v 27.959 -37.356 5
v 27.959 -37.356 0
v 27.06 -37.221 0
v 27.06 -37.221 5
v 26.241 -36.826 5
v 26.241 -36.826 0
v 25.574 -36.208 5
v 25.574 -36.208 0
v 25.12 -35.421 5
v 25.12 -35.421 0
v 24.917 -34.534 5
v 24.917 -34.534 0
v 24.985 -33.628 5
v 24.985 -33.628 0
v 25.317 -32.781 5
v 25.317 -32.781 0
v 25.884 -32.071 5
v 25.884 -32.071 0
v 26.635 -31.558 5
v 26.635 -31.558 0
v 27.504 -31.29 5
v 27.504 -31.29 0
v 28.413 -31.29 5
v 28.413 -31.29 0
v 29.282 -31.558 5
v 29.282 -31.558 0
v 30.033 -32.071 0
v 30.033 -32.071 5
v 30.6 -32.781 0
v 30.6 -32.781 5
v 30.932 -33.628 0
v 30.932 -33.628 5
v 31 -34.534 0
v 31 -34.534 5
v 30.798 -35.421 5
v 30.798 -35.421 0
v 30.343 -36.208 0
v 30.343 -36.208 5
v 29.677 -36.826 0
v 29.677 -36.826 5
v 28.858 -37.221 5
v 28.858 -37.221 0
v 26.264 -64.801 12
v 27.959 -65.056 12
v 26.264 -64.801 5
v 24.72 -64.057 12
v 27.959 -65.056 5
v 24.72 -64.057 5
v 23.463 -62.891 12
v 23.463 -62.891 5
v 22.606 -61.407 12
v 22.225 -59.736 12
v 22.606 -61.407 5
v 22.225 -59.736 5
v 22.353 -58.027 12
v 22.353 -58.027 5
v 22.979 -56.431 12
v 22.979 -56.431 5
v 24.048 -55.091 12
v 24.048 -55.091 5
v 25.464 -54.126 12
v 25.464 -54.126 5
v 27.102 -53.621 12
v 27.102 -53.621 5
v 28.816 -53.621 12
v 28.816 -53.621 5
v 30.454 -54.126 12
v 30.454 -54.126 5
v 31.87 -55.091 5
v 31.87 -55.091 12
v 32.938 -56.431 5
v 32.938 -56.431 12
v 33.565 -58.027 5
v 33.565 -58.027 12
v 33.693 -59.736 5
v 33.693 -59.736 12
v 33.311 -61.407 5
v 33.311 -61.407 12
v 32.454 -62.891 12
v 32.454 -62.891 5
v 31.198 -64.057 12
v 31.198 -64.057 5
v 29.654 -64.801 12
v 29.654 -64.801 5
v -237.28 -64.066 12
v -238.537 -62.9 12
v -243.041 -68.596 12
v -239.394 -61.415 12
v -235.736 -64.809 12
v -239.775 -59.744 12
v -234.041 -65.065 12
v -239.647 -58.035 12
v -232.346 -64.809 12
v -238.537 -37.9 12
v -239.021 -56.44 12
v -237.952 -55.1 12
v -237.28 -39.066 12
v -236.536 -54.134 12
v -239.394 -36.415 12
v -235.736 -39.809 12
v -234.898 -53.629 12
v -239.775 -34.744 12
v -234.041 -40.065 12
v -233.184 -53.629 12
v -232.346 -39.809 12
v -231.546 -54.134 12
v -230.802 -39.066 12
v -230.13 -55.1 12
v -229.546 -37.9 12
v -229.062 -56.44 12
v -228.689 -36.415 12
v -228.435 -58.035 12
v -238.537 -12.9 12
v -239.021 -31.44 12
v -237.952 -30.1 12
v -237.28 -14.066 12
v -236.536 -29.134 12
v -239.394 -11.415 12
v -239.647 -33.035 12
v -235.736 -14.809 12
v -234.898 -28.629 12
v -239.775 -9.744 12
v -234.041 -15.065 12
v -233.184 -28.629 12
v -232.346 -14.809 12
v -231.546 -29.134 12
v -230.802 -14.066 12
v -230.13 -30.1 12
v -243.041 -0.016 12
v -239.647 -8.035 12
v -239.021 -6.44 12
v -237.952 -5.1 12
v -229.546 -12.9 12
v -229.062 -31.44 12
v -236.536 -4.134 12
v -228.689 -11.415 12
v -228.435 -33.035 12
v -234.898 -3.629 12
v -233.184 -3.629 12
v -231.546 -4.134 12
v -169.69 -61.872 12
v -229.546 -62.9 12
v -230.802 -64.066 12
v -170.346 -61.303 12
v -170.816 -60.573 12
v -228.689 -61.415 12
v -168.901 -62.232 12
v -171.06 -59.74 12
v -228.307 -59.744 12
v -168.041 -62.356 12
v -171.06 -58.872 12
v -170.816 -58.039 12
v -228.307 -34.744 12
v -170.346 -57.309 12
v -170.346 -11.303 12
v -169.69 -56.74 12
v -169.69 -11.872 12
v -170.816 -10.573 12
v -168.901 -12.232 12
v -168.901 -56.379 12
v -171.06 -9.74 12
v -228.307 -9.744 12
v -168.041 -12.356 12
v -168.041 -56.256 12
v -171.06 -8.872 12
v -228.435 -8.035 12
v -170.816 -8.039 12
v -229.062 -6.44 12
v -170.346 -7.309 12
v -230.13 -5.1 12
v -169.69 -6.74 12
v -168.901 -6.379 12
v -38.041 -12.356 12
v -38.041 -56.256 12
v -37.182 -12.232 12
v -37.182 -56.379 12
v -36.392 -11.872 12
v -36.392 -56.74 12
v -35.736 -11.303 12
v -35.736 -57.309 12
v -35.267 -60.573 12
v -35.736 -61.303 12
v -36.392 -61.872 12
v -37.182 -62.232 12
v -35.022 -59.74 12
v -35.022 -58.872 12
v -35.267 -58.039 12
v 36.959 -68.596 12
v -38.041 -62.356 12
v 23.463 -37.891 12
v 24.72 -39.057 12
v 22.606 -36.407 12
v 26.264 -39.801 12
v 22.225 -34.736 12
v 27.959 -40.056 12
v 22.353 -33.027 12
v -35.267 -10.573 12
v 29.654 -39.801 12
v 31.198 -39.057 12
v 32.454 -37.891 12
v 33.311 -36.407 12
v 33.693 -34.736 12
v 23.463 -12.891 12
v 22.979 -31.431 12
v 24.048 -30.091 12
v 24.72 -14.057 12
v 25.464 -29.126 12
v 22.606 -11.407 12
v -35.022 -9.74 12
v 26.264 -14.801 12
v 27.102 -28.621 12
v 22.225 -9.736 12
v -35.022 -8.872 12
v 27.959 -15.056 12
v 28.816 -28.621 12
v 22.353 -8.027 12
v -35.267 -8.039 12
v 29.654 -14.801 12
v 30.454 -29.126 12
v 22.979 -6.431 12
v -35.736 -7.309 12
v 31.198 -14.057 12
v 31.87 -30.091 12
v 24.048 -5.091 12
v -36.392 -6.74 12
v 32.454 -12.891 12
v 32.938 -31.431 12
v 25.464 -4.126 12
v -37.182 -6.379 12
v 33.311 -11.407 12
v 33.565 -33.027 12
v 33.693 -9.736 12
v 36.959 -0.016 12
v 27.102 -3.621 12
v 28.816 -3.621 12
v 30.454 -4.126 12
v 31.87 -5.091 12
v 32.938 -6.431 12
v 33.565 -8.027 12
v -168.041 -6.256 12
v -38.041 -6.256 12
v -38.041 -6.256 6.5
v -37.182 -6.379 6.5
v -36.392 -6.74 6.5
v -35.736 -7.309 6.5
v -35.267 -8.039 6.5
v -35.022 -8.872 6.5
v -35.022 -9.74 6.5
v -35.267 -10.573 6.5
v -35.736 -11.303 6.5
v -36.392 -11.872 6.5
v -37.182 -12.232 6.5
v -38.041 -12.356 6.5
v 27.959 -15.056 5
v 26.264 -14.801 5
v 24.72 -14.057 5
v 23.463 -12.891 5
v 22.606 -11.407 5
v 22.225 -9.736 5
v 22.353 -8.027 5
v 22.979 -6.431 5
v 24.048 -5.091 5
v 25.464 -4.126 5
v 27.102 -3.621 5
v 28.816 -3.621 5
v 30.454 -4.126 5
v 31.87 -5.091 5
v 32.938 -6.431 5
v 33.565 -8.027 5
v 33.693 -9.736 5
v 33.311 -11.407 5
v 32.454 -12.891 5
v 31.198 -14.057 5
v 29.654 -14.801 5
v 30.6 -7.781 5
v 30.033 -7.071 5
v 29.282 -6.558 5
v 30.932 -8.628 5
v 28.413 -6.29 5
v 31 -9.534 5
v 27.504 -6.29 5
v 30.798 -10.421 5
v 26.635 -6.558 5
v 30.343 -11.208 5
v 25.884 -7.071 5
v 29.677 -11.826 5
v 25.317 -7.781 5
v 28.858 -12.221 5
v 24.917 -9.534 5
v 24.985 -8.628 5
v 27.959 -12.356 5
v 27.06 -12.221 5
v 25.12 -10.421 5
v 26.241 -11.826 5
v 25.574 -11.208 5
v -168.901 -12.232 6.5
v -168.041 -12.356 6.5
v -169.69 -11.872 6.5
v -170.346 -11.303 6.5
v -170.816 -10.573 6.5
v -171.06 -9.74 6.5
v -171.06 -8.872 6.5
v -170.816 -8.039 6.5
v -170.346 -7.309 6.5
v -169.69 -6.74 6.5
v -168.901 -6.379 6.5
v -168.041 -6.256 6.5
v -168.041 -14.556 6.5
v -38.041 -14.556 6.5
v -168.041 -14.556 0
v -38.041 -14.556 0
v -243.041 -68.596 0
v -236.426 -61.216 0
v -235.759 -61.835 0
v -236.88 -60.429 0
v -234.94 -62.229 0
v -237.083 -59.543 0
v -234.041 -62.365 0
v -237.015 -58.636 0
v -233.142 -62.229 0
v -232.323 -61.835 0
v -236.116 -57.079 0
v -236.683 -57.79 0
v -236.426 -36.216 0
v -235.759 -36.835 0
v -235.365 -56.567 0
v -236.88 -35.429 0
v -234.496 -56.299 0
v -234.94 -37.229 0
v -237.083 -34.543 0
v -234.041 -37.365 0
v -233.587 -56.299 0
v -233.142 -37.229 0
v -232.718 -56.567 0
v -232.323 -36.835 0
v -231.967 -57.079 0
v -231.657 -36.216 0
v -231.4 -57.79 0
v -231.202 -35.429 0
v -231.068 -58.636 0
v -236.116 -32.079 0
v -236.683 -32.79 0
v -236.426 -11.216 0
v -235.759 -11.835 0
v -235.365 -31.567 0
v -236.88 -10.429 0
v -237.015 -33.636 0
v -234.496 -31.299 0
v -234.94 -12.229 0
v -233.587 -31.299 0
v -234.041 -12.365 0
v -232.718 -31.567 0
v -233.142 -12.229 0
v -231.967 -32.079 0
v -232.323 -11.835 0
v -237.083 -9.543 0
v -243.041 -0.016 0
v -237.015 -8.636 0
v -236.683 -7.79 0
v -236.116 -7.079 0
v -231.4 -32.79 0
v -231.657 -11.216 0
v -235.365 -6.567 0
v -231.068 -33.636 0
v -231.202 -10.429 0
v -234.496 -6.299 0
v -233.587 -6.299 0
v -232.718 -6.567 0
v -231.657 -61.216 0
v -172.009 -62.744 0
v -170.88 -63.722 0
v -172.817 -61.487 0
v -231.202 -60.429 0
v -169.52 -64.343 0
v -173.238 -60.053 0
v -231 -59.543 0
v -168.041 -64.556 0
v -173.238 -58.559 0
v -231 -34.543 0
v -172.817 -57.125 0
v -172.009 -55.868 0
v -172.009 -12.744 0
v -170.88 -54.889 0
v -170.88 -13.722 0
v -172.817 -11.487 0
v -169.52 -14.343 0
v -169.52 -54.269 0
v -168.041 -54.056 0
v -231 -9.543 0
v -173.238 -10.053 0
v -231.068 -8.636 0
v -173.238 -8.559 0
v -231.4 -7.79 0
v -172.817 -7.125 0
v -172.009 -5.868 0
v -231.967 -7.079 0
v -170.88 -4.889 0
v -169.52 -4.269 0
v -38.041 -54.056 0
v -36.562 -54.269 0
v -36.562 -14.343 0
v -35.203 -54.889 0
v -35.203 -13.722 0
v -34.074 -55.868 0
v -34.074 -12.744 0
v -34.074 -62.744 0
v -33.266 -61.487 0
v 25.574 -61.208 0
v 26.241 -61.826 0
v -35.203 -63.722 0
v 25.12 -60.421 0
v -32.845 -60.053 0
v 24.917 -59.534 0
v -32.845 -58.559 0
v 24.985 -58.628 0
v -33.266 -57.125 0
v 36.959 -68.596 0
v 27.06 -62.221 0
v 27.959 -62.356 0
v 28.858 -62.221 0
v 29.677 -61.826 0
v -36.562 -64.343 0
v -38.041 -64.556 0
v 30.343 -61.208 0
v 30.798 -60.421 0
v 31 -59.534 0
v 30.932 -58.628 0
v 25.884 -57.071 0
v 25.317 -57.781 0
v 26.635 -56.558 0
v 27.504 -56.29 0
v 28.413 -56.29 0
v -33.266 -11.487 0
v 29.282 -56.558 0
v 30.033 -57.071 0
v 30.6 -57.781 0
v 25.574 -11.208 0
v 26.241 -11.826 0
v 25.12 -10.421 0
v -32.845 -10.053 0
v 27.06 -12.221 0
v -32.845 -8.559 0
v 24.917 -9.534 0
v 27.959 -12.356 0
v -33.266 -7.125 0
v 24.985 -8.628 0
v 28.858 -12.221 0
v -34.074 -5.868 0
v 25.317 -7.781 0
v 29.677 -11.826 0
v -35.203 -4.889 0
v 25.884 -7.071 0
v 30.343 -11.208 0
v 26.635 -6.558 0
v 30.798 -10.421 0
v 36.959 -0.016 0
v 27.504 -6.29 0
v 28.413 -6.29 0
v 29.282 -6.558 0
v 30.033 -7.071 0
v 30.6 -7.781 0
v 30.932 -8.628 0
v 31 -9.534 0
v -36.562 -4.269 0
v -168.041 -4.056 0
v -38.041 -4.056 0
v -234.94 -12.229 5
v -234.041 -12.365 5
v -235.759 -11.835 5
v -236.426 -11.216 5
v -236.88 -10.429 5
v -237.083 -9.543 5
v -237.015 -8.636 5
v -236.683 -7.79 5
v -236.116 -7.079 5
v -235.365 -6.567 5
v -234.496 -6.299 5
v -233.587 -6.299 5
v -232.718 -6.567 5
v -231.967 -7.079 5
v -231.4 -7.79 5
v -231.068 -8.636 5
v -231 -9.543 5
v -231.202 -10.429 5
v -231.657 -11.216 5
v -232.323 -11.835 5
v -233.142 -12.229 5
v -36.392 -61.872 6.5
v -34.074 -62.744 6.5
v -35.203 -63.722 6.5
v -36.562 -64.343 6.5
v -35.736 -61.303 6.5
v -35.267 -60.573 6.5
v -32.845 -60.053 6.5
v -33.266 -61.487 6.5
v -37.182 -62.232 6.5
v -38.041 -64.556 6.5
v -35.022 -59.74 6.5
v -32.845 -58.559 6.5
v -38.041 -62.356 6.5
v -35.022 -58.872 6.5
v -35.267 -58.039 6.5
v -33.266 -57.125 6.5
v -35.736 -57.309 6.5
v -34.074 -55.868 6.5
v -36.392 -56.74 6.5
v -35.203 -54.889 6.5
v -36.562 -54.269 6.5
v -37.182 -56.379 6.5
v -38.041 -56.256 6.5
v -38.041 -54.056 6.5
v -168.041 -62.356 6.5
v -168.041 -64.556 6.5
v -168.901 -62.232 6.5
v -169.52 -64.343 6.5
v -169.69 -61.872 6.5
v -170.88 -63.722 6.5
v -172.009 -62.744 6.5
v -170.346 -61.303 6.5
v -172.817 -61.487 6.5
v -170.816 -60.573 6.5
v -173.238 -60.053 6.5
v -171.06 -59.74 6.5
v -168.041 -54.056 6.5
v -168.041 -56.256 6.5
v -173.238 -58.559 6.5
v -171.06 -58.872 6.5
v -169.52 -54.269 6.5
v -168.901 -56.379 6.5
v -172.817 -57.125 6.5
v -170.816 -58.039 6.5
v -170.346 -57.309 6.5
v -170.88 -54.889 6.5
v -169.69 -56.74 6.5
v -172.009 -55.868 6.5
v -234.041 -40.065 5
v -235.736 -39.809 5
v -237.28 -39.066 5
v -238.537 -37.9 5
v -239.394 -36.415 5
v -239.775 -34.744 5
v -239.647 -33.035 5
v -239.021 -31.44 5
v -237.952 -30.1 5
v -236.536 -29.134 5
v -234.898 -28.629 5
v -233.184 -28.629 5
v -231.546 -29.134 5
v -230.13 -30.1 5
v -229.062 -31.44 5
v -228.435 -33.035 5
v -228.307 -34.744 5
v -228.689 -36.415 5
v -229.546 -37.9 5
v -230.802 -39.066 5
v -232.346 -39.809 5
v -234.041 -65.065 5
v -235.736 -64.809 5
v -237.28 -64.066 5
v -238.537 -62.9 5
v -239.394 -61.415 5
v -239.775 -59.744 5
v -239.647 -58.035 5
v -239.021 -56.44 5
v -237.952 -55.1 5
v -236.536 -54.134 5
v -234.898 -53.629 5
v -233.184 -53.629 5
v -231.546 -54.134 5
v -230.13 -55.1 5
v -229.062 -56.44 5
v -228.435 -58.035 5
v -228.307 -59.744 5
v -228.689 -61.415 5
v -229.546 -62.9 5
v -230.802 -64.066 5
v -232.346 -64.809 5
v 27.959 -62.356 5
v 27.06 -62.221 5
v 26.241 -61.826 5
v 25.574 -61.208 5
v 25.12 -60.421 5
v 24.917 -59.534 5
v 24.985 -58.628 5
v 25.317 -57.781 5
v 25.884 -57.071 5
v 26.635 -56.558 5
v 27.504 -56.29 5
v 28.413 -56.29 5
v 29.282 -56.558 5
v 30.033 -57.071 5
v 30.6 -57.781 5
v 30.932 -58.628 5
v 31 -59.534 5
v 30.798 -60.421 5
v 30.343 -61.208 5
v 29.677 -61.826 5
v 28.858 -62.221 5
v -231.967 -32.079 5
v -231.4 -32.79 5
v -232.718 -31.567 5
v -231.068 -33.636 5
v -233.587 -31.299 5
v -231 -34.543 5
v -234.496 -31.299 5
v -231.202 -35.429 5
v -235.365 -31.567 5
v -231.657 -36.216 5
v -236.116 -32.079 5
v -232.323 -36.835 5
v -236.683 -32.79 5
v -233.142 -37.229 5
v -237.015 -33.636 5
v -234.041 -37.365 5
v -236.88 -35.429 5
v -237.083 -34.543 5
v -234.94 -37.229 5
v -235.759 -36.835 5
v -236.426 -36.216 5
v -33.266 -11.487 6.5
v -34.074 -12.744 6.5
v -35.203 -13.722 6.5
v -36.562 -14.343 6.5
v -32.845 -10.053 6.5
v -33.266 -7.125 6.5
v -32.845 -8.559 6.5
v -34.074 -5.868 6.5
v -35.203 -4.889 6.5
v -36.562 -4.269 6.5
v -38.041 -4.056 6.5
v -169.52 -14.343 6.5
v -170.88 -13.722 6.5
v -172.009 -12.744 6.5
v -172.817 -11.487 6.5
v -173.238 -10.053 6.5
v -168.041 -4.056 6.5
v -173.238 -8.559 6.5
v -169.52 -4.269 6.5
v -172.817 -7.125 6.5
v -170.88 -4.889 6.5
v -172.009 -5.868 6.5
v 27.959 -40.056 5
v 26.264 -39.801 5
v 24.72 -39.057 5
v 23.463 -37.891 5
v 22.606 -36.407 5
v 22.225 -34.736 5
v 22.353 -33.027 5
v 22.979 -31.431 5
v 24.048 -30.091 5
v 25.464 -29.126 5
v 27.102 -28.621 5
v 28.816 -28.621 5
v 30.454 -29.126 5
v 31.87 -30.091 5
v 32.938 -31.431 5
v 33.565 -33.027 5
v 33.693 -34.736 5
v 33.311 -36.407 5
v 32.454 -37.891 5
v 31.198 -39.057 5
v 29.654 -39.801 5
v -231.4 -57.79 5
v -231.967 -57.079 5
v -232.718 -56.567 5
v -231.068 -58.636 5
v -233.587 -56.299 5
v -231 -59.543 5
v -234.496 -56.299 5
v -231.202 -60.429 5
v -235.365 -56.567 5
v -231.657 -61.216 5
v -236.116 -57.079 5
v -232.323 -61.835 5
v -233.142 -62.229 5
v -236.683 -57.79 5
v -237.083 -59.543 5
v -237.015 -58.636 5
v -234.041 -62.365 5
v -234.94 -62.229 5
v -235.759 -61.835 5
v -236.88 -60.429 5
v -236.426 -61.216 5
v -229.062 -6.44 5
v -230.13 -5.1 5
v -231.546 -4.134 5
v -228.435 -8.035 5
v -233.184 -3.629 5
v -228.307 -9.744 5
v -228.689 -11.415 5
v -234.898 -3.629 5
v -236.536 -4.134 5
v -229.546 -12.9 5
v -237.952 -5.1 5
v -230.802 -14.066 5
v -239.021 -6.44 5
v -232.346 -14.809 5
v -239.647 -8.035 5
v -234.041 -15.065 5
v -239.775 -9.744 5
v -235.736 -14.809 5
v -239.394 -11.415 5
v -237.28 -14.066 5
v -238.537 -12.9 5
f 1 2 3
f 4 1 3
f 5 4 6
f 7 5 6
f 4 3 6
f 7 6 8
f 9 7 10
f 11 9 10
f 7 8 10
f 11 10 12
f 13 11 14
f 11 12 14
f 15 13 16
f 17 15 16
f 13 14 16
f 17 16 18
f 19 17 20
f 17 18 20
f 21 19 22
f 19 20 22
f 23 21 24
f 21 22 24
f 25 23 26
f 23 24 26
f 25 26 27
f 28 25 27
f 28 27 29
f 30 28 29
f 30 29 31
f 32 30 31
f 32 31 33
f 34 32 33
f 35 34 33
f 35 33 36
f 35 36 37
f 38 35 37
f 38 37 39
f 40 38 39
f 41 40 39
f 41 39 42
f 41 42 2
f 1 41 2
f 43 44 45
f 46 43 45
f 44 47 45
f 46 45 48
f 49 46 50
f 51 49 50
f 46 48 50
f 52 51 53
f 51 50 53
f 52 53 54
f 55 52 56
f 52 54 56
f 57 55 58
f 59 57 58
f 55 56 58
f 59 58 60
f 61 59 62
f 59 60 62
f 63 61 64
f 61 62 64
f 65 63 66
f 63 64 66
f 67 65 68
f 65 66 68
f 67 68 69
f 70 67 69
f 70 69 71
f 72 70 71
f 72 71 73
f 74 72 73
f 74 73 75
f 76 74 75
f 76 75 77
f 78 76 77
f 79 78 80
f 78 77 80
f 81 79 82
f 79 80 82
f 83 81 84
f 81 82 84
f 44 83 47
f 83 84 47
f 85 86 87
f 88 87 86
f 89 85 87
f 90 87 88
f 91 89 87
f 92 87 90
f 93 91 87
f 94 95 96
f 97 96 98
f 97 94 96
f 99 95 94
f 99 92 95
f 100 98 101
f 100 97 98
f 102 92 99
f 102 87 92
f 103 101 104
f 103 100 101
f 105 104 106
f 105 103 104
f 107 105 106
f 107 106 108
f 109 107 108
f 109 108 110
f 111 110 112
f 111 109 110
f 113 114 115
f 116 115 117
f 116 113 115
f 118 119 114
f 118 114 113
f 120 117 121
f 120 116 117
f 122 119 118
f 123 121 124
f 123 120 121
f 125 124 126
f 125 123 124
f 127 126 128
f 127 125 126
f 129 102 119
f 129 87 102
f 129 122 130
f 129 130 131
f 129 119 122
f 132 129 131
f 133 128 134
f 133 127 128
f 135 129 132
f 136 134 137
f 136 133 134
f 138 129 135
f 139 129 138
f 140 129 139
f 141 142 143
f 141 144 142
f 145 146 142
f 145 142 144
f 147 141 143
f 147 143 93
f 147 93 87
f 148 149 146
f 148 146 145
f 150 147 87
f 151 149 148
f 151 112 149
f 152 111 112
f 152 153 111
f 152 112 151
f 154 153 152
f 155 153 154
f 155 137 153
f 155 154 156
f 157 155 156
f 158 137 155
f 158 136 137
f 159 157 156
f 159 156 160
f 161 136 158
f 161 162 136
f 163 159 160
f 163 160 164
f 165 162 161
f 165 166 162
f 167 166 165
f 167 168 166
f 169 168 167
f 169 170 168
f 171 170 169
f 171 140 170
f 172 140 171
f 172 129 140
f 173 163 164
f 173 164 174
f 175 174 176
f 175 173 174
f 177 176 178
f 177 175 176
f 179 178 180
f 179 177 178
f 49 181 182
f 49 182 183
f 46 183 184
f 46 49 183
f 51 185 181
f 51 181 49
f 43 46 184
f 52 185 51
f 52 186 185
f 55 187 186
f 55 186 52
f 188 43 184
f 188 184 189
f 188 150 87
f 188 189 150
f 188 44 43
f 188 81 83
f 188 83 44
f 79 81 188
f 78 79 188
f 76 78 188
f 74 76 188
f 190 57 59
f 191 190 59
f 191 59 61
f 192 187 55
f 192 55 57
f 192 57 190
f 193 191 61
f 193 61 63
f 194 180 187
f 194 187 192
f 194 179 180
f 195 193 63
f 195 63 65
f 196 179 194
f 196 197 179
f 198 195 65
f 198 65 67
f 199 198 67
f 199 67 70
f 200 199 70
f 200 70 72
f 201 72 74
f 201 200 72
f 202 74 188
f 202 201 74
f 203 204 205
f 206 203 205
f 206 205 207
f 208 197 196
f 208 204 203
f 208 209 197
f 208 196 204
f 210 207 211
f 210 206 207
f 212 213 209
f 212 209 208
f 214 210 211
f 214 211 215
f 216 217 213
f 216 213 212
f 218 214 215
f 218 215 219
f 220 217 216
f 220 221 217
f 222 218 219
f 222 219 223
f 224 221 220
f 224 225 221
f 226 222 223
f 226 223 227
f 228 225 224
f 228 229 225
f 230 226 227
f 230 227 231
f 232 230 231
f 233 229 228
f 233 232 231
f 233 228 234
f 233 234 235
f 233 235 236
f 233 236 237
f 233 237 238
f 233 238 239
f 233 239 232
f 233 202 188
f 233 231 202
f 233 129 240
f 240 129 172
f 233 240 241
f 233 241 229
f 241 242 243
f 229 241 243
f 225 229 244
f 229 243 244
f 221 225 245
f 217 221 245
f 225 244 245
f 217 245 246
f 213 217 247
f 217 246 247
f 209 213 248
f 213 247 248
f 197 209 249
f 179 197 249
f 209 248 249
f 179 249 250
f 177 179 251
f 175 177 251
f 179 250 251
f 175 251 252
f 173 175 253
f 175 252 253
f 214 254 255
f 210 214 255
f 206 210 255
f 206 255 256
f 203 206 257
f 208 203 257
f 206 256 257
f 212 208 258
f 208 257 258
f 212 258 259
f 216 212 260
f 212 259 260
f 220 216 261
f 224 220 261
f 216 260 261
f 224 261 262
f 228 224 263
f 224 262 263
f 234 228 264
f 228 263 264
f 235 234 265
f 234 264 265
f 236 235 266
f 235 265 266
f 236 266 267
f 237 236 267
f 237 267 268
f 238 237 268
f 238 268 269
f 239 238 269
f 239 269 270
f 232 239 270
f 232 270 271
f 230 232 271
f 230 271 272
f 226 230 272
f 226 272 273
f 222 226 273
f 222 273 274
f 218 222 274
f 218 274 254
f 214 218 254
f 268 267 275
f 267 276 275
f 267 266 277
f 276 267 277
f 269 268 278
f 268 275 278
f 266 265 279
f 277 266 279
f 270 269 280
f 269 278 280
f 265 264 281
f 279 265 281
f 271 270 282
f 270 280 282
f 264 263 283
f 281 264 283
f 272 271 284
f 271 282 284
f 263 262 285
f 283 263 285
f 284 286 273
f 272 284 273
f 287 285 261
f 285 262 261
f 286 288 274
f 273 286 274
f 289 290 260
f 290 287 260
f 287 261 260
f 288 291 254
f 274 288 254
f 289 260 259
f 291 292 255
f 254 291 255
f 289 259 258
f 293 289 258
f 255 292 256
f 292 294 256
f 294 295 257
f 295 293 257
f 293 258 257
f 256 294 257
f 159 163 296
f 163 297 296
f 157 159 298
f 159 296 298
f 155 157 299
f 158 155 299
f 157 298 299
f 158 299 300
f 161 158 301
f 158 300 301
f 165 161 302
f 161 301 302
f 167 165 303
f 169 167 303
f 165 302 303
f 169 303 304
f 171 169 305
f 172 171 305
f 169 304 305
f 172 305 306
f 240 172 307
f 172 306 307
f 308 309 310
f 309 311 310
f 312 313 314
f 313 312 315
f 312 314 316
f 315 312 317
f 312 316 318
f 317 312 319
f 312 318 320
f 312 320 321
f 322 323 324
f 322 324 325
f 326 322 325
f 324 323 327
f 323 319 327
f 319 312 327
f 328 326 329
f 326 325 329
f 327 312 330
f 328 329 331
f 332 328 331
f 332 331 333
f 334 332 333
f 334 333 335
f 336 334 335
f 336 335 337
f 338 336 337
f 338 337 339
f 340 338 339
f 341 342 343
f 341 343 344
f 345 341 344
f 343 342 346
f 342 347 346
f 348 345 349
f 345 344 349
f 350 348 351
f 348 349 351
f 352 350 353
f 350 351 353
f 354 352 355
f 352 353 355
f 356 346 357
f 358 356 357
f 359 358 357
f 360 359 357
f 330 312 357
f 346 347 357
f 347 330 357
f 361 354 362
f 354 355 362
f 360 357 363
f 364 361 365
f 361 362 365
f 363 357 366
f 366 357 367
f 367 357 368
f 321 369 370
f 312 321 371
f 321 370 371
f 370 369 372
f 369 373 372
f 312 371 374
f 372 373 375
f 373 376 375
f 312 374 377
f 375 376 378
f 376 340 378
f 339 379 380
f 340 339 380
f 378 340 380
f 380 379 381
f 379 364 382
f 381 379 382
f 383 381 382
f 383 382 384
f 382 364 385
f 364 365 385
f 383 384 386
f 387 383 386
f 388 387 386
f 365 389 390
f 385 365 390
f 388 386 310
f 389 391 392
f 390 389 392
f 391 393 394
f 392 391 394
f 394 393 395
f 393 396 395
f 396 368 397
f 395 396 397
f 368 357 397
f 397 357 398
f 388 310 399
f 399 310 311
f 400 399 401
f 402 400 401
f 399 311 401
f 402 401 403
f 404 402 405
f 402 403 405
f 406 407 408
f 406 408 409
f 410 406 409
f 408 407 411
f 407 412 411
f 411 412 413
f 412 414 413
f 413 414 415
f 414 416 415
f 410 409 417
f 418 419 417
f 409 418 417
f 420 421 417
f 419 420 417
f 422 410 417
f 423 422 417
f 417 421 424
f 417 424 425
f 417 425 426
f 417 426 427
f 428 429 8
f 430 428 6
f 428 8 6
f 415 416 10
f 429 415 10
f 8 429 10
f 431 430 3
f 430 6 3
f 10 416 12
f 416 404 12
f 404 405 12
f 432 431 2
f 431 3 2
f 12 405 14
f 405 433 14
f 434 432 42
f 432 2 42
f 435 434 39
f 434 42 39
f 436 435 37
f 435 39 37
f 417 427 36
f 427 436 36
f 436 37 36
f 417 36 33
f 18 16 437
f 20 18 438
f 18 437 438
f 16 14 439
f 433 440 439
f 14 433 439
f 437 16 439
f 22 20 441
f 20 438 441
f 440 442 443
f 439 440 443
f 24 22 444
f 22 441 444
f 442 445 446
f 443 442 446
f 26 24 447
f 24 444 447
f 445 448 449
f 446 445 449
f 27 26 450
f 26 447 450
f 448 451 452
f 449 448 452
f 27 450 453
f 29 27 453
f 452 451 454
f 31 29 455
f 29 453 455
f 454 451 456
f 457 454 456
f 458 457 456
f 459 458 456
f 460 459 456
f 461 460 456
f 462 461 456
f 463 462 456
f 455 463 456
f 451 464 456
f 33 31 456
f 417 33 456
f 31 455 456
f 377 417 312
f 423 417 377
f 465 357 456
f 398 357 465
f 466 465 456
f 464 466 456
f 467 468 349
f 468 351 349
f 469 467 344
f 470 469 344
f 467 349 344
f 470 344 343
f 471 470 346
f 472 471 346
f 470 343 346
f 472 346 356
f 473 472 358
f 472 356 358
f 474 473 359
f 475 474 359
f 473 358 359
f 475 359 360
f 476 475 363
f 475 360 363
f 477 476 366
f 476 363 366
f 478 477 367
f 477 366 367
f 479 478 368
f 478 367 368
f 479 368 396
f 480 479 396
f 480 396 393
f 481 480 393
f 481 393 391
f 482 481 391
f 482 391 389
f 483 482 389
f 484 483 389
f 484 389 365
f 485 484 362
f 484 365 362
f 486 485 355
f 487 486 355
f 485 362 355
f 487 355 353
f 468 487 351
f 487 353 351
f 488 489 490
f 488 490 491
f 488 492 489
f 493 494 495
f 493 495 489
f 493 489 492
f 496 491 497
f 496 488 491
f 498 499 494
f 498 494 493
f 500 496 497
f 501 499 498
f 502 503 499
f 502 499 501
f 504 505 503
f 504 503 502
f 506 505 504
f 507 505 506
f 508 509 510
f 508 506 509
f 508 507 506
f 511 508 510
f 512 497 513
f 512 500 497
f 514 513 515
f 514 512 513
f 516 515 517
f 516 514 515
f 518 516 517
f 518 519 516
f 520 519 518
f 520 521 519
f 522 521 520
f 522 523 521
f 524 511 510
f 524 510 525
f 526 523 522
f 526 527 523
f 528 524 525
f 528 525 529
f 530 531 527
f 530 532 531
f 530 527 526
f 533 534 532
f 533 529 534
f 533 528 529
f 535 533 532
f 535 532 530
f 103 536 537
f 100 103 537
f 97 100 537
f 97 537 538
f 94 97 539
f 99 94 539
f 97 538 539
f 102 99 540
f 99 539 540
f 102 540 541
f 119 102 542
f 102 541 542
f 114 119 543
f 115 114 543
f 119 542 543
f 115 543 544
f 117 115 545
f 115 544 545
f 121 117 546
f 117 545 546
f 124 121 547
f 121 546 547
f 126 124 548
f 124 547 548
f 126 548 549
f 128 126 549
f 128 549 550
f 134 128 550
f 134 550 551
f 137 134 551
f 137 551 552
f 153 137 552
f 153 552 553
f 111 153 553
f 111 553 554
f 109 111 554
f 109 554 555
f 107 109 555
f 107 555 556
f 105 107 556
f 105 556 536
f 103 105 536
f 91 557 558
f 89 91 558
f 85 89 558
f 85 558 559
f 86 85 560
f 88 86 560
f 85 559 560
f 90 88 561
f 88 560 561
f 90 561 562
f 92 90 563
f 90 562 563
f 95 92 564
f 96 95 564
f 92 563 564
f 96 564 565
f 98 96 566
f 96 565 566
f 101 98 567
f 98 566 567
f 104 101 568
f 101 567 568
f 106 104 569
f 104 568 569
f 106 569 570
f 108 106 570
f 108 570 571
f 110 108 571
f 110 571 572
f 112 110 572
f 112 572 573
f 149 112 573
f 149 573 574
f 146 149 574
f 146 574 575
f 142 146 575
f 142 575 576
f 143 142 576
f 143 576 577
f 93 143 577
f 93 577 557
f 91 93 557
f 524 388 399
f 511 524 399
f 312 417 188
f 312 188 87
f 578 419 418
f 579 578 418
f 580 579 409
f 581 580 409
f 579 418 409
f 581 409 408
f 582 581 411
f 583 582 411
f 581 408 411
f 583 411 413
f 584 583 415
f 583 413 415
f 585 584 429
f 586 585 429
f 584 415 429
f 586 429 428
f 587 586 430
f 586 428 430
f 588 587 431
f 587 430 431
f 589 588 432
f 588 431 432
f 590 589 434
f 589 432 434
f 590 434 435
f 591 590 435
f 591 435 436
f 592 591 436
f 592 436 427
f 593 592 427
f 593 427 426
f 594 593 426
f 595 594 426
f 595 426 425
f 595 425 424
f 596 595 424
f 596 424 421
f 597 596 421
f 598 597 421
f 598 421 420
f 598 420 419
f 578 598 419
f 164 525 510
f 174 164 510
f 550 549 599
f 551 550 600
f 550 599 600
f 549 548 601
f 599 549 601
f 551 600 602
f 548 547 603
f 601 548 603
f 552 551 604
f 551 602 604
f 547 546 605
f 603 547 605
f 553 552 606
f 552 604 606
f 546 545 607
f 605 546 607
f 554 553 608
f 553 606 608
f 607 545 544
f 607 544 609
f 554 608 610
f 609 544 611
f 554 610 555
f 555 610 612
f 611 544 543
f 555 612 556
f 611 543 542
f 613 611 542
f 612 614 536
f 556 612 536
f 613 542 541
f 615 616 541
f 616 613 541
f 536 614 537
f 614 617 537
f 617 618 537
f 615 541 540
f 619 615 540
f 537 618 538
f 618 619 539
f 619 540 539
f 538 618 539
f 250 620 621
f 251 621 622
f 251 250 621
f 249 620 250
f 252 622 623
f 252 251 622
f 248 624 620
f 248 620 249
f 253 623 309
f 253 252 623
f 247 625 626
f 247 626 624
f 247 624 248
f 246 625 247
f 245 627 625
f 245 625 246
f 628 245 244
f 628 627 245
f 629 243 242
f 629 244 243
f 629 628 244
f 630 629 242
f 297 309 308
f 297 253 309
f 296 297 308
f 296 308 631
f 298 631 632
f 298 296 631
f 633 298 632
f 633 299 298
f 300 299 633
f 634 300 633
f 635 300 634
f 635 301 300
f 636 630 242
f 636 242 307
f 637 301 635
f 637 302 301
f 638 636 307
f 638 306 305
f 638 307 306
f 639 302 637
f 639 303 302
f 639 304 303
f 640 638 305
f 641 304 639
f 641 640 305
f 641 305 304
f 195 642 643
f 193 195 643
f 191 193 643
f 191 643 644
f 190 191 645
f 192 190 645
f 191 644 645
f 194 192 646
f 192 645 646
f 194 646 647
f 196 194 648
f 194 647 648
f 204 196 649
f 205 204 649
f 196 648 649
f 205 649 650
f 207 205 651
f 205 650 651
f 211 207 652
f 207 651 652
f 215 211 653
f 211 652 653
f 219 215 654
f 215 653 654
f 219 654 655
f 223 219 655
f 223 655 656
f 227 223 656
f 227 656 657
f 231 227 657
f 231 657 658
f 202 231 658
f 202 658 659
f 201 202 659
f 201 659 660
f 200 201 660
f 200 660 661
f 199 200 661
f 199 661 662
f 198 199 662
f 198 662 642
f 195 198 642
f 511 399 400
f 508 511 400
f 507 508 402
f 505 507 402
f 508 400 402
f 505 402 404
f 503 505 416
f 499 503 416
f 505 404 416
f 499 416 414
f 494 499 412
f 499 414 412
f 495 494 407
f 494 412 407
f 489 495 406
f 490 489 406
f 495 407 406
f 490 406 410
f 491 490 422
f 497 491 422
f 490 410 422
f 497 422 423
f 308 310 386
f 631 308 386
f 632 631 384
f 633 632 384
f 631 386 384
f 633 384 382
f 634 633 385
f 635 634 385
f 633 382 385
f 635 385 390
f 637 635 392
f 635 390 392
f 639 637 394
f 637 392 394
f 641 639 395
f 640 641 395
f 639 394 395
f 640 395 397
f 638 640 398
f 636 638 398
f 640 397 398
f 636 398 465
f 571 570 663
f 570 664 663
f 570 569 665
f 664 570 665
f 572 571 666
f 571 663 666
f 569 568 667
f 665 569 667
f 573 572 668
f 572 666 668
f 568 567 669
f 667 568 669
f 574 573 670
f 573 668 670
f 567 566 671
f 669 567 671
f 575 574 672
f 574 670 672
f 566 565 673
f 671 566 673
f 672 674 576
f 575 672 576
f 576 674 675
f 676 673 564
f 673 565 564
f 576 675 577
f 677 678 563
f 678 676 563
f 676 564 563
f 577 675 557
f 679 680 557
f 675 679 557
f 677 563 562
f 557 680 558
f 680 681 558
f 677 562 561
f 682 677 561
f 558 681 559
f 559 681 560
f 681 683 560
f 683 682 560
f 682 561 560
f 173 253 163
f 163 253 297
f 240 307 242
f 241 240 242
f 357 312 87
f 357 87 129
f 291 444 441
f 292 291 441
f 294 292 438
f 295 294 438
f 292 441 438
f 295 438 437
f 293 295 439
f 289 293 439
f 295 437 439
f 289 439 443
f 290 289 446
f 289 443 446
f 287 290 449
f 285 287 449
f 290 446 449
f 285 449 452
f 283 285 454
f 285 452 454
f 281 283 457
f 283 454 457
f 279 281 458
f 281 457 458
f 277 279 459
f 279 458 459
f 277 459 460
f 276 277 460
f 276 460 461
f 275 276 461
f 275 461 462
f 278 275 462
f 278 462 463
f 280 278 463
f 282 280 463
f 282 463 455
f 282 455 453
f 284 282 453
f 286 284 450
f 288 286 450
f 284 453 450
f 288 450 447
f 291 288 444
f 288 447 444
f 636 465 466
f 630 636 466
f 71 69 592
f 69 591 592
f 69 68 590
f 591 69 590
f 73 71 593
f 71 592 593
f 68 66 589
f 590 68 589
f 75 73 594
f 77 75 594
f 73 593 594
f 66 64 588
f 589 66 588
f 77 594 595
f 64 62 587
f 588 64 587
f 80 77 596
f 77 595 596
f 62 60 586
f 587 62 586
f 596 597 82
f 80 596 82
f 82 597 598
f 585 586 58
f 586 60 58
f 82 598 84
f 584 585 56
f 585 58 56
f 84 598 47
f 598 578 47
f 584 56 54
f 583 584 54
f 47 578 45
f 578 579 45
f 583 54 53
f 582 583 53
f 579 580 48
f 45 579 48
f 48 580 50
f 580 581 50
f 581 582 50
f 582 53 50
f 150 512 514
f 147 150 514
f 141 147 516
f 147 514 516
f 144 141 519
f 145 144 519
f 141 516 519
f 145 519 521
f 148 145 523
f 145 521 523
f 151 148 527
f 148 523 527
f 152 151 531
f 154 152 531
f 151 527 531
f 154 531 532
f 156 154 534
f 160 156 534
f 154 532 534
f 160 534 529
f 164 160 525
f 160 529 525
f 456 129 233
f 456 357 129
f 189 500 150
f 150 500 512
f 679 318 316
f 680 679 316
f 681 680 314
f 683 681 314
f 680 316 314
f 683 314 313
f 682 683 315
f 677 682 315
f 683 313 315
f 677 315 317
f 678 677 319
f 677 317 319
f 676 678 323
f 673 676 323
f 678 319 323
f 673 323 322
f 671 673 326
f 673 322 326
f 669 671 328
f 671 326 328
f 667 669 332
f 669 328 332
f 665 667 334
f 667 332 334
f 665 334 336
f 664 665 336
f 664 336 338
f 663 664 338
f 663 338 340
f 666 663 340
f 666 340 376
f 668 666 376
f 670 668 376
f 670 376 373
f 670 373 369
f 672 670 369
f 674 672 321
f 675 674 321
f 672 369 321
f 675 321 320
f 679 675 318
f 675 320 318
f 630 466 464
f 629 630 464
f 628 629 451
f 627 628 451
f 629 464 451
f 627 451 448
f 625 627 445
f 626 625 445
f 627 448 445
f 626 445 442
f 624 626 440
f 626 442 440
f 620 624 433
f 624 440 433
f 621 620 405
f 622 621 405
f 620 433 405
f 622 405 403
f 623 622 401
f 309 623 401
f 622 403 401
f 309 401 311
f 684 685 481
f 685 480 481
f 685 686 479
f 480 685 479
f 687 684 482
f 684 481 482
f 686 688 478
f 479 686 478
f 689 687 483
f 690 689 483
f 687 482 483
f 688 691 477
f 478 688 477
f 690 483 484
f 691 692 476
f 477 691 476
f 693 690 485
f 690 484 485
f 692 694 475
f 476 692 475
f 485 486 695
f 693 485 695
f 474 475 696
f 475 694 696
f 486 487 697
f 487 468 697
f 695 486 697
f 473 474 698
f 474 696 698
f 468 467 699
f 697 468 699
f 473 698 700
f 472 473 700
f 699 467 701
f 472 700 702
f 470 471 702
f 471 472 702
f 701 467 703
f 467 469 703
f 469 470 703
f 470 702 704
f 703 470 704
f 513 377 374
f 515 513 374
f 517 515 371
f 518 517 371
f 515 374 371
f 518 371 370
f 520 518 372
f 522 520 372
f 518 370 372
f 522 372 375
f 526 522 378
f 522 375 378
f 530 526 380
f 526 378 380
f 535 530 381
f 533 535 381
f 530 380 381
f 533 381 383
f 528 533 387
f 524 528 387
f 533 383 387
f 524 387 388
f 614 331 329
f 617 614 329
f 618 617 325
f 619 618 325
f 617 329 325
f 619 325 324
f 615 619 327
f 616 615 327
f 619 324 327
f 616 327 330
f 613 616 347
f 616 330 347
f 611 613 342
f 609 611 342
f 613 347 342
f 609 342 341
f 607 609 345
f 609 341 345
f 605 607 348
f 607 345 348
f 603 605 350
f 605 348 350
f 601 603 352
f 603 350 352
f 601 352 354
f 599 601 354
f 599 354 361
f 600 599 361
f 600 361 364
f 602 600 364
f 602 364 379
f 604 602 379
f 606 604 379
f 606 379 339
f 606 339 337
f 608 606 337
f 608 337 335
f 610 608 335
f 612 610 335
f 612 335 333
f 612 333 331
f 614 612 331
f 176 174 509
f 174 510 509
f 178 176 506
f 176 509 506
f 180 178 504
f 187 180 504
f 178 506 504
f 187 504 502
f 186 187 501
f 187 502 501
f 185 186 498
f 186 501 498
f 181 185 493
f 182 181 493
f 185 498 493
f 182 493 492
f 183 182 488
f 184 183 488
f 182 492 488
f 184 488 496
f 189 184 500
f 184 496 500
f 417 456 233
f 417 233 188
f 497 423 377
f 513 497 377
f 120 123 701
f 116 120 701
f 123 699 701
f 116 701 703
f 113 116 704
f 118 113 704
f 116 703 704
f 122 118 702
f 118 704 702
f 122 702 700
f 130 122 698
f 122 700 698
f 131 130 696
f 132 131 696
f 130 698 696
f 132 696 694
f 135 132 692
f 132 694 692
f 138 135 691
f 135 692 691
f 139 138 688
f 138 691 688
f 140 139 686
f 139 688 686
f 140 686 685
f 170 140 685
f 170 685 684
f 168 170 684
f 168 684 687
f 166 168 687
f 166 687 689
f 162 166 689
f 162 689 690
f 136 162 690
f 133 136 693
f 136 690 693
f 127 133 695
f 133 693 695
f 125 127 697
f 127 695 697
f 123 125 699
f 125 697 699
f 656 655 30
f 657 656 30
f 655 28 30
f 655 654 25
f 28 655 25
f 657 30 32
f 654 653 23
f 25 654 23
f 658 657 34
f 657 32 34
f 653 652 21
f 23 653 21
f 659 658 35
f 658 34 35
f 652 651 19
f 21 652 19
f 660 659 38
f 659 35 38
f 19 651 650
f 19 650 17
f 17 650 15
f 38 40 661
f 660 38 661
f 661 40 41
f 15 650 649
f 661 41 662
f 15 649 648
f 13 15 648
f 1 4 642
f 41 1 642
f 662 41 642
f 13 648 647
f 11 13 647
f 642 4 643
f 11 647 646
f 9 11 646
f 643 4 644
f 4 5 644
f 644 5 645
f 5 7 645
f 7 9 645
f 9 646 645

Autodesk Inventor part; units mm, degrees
ref_plane "YZ Plane" through (0, 0, 0) normal (1, 0, 0) x (0, 1, 0)
ref_plane "XZ Plane" through (0, 0, 0) normal (0, 1, 0) x (-1, 0, 0)
ref_plane "XY Plane" through (0, 0, 0) normal (0, 0, 1) x (1, 0, 0)
sketch "Sketch1" plane through (0, 0, 0) normal (0, 0, 1) x (1, 0, 0)
  line L0 (-201.9864, -0.0159) -> (-218.1154, -0.0159) construction
  line L1 (-201.9864, -68.5959) -> (-218.1154, -68.5959) construction
  circle A0 centre (-234.0413, -9.3123) radius 2.5 construction
  circle A1 centre (-234.0413, -34.3059) radius 2.5 construction
  circle A2 centre (-234.0413, -59.2995) radius 2.5 construction
  line L2 (0.4039, -68.5877) -> (16.5329, -68.5877) construction
  line L3 (0.4039, -0.0077) -> (16.5329, -0.0077) construction
  circle A3 centre (27.9587, -59.2913) radius 2.5 construction
  circle A4 centre (27.9587, -34.2977) radius 2.5 construction
  circle A5 centre (27.9587, -9.3041) radius 2.5 construction
  line L4 (-243.0413, -0.0159) -> (36.9587, -0.0159)
  line L5 (36.9587, -0.0159) -> (36.9587, -68.5959)
  line L6 (36.9587, -68.5959) -> (-243.0413, -68.5959)
  line L7 (-243.0413, -68.5959) -> (-243.0413, -0.0159)
  line L8 (-103.0413, -534.726) -> (-103.0413, 430.7972) construction
  point P0 (0, 0)
  dimension "w" = 280
  dimension "d23" = 140
  dimension "d" = 262
  dimension "d34" = 131
extrude "Extrusion1" add sketch "Sketch1" along normal blind 12
sketch "Sketch4" plane through (0, 0, 0) normal (0, 0, -1) x (-1, 0, 0)
  circle A0 centre (65.5413, -59.3059) radius 2.5 construction
  circle A1 centre (40.5413, -59.3059) radius 2.5 construction
  circle A2 centre (140.5413, -9.3059) radius 2.5 construction
  circle A3 centre (115.5413, -9.3059) radius 2.5 construction
  line L0 (40.5413, -59.3059) -> (172.5963, -59.3059) construction
  line L1 (167.5124, -9.3059) -> (3.0086, -9.3059) construction
  line L2 (243.0413, -0.0159) -> (-36.9587, -0.0159) construction
  line L3 (38.0413, -9.3059) -> (168.0413, -9.3059) construction
  line L4 (38.0413, -12.3559) -> (168.0413, -12.3559)
  line L5 (168.0413, -6.2559) -> (38.0413, -6.2559)
  arc A4 (38.0413, -6.2559) -> (38.0413, -12.3559) centre (38.0413, -9.3059) ccw
  arc A5 (168.0413, -12.3559) -> (168.0413, -6.2559) centre (168.0413, -9.3059) ccw
  line L6 (103.0413, 455.7975) -> (103.0413, -509.7257) construction
  line L7 (38.0413, -59.3059) -> (168.0413, -59.3059) construction
  line L8 (38.0413, -62.3559) -> (168.0413, -62.3559)
  line L9 (168.0413, -56.2559) -> (38.0413, -56.2559)
  arc A6 (38.0413, -56.2559) -> (38.0413, -62.3559) centre (38.0413, -59.3059) ccw
  arc A7 (168.0413, -62.3559) -> (168.0413, -56.2559) centre (168.0413, -59.3059) ccw
  point P0 (0, 0)
  point P1 (-36.9587, -0.0159)
  point P2 (103.0413, -9.3059)
  point P3 (103.0413, -59.3059)
  dimension "d10" = 9.29
  dimension "d11" = 6.1
  dimension "d12" = 65
  dimension "d13" = 65
  dimension "d14" = 6.1
  dimension "d15" = 65
  dimension "d16" = 65
extrude "Extrusion2" cut sketch "Sketch4" against normal blind 12
sketch "Sketch5" plane through (0, 0, 0) normal (0, 0, -1) x (-1, 0, 0)
  line L0 (45.6373, -31.0674) -> (77.6413, -31.0674) construction
  arc A0 (168.0413, -12.3559) -> (168.0413, -6.2559) centre (168.0413, -9.3059) ccw construction
  arc A1 (168.0413, -62.3559) -> (168.0413, -56.2559) centre (168.0413, -59.3059) ccw construction
  arc A2 (38.0413, -6.2559) -> (38.0413, -12.3559) centre (38.0413, -9.3059) ccw construction
  arc A3 (38.0413, -56.2559) -> (38.0413, -62.3559) centre (38.0413, -59.3059) ccw construction
  line L1 (38.0413, -9.3059) -> (168.0413, -9.3059) construction
  line L2 (-36.9587, -0.0159) -> (243.0413, -0.0159) projected
  line L3 (38.0413, -14.5559) -> (168.0413, -14.5559)
  line L4 (168.0413, -4.0559) -> (38.0413, -4.0559)
  arc A4 (38.0413, -4.0559) -> (38.0413, -14.5559) centre (38.0413, -9.3059) ccw
  arc A5 (168.0413, -14.5559) -> (168.0413, -4.0559) centre (168.0413, -9.3059) ccw
  line L5 (38.0413, -59.3059) -> (168.0413, -59.3059) construction
  line L6 (38.0413, -64.5559) -> (168.0413, -64.5559)
  line L7 (168.0413, -54.0559) -> (38.0413, -54.0559)
  arc A6 (38.0413, -54.0559) -> (38.0413, -64.5559) centre (38.0413, -59.3059) ccw
  arc A7 (168.0413, -64.5559) -> (168.0413, -54.0559) centre (168.0413, -59.3059) ccw
  point P0 (0, 0)
  point P1 (243.0413, -0.0159)
  point P2 (103.0413, -9.3059)
  point P3 (103.0413, -59.3059)
  dimension "d19" = 10.5
  dimension "d20" = 10.5
extrude "Extrusion3" cut sketch "Sketch5" against normal blind 6.5
sketch "Sketch6" plane through (0, 0, 12) normal (0, 0, 1) x (1, 0, 0)
  line L0 (-103.0413, -534.726) -> (-103.0413, 430.7972) construction
  point P0 (0, 0)
  point P1 (27.9587, -59.3064)
  point P2 (27.9587, -34.3064)
  point P3 (27.9587, -9.3064)
  point P4 (-234.0413, -59.3147)
  point P5 (-234.0413, -34.3147)
  point P6 (-234.0413, -9.3147)
  dimension "d36" = 25
  dimension "d37" = 262
  dimension "d38" = 131
hole "Hole2" at (27.9587, -59.3064, 12) at (27.9587, -34.3064, 12) at (27.9587, -9.3064, 12) at (-234.0413, -59.3147, 12) at (-234.0413, -34.3147, 12) at (-234.0413, -9.3147, 12) direction (0, 0, -1) diameter 6.1 end through all counterbore diameter 11.5 counterbore depth 7
equation "\"d23\" = 0.5 * w"
equation "\"d34\" = 0.5 * d"
equation "\"d37\" = d"
equation "\"d38\" = 0.5 * d"
properties part number "ASI_mesoSPIM_Bridge"
